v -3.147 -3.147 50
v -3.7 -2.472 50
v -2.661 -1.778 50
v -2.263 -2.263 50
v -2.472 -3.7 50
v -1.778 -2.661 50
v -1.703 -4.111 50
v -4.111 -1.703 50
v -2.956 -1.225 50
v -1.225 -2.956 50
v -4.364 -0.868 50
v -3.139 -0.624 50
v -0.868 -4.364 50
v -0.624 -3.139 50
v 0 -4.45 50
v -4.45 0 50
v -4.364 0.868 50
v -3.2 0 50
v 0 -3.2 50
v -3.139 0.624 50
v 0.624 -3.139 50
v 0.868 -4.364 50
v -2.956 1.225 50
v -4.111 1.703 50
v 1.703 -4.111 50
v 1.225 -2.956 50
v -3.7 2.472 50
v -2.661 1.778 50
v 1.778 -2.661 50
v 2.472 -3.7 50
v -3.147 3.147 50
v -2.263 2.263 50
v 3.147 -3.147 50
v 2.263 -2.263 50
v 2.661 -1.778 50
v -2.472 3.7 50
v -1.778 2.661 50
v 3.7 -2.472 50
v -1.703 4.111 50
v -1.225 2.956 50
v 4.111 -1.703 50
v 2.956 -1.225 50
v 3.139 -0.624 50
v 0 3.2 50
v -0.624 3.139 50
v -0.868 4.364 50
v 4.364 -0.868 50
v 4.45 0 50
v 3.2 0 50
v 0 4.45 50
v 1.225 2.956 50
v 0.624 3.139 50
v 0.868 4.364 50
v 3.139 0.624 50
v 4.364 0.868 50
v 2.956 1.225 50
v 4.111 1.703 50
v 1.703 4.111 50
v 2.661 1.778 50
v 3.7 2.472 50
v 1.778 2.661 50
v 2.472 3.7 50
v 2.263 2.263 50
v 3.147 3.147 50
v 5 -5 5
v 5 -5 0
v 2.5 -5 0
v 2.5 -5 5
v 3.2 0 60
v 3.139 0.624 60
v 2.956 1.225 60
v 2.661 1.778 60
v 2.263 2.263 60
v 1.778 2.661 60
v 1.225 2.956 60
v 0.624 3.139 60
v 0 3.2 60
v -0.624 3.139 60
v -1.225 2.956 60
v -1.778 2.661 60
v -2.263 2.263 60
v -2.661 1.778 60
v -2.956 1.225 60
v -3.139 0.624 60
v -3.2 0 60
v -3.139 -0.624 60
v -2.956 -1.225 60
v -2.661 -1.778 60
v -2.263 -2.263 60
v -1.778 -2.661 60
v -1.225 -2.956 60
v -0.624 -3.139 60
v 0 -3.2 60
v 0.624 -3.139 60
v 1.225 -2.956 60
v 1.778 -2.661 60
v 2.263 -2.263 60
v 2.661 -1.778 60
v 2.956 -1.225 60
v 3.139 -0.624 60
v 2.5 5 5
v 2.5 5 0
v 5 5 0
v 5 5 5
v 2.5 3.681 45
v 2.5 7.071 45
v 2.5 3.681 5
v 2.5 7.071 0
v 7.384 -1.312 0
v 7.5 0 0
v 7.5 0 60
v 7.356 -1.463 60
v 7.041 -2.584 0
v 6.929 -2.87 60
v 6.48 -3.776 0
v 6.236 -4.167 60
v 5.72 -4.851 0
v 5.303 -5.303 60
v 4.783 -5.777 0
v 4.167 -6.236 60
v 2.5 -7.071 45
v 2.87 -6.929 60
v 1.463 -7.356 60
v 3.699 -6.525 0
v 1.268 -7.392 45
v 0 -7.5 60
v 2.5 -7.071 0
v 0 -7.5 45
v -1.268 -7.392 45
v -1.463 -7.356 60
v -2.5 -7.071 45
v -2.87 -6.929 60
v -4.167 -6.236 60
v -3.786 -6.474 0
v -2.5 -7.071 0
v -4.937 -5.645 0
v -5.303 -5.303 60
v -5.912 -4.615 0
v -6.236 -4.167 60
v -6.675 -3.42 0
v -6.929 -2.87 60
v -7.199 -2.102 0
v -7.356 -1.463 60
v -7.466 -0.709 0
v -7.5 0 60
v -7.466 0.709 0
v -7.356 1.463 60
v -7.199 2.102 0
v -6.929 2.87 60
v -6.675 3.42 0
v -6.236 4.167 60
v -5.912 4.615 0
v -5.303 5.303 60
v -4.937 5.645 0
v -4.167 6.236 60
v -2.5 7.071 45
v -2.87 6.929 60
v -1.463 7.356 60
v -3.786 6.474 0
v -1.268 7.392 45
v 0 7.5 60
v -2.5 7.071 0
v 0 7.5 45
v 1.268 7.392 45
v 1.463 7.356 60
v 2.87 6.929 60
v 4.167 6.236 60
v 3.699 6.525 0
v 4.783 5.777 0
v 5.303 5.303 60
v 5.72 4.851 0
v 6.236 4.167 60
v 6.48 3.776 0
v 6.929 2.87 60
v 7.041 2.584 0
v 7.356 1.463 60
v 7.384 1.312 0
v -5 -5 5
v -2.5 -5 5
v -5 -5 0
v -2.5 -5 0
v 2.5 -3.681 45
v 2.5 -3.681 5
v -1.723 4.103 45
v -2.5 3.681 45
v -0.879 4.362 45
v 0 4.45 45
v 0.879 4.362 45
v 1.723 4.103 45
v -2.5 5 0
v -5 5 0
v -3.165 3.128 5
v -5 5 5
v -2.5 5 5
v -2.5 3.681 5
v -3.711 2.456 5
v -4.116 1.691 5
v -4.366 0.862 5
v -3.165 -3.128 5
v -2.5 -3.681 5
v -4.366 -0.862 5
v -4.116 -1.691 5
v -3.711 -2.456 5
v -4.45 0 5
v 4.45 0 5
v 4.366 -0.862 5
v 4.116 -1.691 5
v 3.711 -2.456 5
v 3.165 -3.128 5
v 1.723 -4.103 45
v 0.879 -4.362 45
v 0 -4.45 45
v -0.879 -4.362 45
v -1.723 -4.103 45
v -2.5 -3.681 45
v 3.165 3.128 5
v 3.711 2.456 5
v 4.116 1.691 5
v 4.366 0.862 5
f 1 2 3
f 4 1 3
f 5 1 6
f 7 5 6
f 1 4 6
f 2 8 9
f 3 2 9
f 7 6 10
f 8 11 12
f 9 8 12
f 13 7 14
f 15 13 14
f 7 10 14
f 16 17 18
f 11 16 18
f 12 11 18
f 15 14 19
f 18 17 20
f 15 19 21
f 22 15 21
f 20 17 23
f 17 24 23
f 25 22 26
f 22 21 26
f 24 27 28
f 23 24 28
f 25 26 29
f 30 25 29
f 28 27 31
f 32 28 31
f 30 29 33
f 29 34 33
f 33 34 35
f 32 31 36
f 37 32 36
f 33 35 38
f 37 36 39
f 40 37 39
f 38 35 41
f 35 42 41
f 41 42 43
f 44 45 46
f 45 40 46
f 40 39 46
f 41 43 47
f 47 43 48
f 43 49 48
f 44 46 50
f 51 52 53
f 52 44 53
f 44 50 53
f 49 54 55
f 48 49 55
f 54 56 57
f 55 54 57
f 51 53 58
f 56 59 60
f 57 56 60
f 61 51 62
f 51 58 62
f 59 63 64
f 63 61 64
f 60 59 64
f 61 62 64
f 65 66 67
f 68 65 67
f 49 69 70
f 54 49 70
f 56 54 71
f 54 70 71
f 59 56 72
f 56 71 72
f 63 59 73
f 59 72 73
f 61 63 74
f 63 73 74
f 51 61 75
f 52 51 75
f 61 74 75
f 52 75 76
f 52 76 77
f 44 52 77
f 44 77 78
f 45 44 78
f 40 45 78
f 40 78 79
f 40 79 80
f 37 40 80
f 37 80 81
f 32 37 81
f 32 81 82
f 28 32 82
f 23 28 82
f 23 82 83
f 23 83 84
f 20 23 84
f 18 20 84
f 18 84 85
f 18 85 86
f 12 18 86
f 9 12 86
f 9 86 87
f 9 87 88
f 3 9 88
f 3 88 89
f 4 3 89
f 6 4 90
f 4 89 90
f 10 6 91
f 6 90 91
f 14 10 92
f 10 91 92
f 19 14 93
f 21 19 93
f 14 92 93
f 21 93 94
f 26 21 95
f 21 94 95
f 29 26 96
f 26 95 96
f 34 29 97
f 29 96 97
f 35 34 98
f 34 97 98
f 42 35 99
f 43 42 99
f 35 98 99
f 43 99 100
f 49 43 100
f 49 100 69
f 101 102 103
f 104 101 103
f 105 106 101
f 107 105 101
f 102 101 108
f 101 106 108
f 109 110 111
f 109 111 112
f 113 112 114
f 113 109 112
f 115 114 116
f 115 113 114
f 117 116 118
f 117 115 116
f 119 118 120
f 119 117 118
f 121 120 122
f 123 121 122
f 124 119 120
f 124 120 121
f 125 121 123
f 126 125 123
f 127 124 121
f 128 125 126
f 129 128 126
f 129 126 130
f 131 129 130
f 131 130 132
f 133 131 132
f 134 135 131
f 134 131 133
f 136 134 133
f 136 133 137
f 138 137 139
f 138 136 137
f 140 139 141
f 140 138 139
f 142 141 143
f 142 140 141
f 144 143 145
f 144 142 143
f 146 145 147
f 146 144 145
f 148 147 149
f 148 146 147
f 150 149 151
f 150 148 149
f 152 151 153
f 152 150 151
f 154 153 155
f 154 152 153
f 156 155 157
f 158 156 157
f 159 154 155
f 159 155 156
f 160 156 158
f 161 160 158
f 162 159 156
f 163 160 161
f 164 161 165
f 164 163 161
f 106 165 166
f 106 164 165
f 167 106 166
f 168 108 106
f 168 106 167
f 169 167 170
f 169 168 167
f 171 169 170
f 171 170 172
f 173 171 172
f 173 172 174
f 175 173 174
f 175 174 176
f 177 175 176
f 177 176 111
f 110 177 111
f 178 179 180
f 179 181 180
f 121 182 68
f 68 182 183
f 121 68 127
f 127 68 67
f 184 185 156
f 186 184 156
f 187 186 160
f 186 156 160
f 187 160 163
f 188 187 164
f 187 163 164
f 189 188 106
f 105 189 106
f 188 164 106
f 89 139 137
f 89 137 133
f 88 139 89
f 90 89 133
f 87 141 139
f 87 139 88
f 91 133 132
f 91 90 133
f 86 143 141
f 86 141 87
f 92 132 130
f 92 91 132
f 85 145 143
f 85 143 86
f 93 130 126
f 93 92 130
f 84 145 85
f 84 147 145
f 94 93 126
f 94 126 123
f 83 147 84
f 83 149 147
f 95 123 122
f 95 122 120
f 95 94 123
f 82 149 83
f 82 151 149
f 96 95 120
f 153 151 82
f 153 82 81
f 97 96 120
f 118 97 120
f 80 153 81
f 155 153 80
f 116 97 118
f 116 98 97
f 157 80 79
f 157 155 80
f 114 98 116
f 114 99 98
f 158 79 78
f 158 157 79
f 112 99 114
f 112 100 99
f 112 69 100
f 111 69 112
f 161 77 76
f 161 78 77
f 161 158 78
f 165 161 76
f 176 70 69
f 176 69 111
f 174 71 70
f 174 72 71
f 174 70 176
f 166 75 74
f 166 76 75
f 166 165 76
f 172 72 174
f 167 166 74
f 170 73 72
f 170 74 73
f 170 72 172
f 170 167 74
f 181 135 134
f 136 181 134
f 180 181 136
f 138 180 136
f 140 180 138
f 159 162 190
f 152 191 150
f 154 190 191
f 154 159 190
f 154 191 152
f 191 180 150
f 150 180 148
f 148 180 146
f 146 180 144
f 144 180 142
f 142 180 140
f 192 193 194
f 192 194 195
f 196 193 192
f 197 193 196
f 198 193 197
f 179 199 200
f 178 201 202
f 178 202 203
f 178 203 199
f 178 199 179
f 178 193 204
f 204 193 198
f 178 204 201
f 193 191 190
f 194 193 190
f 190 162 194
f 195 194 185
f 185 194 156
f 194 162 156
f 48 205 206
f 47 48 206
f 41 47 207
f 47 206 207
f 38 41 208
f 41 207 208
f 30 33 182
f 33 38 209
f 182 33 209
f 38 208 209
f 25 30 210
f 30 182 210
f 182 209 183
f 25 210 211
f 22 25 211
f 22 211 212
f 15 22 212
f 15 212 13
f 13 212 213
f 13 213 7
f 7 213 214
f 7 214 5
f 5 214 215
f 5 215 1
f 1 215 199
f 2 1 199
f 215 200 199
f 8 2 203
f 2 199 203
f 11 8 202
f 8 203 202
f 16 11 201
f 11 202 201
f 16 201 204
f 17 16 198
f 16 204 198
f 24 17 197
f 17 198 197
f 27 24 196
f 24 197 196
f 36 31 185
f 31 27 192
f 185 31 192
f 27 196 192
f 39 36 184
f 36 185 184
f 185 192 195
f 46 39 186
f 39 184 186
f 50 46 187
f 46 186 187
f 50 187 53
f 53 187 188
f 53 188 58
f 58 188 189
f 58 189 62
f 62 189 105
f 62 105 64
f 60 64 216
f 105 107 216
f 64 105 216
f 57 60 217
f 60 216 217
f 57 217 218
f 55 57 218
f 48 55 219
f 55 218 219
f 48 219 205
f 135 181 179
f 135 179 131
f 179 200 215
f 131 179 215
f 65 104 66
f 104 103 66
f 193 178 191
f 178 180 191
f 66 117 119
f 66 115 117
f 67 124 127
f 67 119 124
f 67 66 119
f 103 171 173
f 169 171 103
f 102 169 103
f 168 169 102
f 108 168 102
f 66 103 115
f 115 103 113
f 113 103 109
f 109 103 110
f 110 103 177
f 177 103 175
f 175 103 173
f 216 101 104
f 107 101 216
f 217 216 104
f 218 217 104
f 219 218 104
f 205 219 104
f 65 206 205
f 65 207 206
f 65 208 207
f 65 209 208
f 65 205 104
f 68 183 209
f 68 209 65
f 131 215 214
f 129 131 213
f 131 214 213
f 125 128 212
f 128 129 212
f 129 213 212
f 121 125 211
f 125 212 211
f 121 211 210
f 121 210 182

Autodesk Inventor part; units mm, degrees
ref_plane "YZ Plane" through (0, 0, 0) normal (1, 0, 0) x (0, 1, 0)
ref_plane "XY Plane" through (0, 0, 0) normal (0, 0, 1) x (1, 0, 0)
sketch "Sketch1" plane through (0, 0, 0) normal (0, 0, 1) x (1, 0, 0)
  circle A0 centre (0, 0) radius 4.45
  circle A1 centre (0, 0) radius 7.5
  dimension "d0" = 8.9
  dimension "d1" = 15
extrude "Extrusion1" add sketch "Sketch1" along normal blind 60
ref_plane "Work Plane1" through (0, 7.5, 0) normal (0, 1, 0) x (-1, 0, 0)
sketch "Sketch2" plane through (0, 7.5, 0) normal (0, 1, 0) x (-1, 0, 0)
  line L0 (2.5, 45) -> (-2.5, 45)
  line L1 (-2.5, 45) -> (-2.5, 0)
  line L2 (-2.5, 0) -> (2.5, 0)
  line L3 (2.5, 0) -> (2.5, 45)
  line L4 (7.5, 60) -> (-7.5, 60) projected
  line L5 (-7.5, 0) -> (7.5, 0) projected
  point P0 (0, 0)
  dimension "d4" = 45
  dimension "d6" = 5
  dimension "d7" = 2.5
  dimension "d22" = 0
extrude "Extrusion2" cut sketch "Sketch2" against normal through all
sketch "Sketch3" plane through (0, 0, 60) normal (0, 0, 1) x (1, 0, 0)
  circle A0 centre (0, 0) radius 3.2
  circle A1 centre (0, 0) radius 4.45
  dimension "d10" = 6.4
extrude "Extrusion3" add sketch "Sketch3" against normal blind 10
sketch "Sketch4" plane through (0, 0, 0) normal (0, 0, -1) x (-1, 0, 0)
  circle A0 centre (0, 0) radius 4.45
extrude "Extrusion4" add sketch "Sketch4" against normal blind 5
sketch "Sketch5" plane through (0, 0, 0) normal (0, 0, -1) x (0, -1, 0)
  line L0 (-5, -5) -> (5, -5)
  line L1 (5, -5) -> (5, 5)
  line L2 (5, 5) -> (-5, 5)
  line L3 (-5, 5) -> (-5, -5)
  point P0 (0, 0)
  dimension "d16" = 10
  dimension "d17" = 5
  dimension "d18" = 10
  dimension "d19" = 5
extrude "Extrusion5" cut sketch "Sketch5" against normal blind 5
equation "\"d17\" = 0.5 * d16"
equation "\"d19\" = 0.5 * d18"
properties part number "Rotation"
